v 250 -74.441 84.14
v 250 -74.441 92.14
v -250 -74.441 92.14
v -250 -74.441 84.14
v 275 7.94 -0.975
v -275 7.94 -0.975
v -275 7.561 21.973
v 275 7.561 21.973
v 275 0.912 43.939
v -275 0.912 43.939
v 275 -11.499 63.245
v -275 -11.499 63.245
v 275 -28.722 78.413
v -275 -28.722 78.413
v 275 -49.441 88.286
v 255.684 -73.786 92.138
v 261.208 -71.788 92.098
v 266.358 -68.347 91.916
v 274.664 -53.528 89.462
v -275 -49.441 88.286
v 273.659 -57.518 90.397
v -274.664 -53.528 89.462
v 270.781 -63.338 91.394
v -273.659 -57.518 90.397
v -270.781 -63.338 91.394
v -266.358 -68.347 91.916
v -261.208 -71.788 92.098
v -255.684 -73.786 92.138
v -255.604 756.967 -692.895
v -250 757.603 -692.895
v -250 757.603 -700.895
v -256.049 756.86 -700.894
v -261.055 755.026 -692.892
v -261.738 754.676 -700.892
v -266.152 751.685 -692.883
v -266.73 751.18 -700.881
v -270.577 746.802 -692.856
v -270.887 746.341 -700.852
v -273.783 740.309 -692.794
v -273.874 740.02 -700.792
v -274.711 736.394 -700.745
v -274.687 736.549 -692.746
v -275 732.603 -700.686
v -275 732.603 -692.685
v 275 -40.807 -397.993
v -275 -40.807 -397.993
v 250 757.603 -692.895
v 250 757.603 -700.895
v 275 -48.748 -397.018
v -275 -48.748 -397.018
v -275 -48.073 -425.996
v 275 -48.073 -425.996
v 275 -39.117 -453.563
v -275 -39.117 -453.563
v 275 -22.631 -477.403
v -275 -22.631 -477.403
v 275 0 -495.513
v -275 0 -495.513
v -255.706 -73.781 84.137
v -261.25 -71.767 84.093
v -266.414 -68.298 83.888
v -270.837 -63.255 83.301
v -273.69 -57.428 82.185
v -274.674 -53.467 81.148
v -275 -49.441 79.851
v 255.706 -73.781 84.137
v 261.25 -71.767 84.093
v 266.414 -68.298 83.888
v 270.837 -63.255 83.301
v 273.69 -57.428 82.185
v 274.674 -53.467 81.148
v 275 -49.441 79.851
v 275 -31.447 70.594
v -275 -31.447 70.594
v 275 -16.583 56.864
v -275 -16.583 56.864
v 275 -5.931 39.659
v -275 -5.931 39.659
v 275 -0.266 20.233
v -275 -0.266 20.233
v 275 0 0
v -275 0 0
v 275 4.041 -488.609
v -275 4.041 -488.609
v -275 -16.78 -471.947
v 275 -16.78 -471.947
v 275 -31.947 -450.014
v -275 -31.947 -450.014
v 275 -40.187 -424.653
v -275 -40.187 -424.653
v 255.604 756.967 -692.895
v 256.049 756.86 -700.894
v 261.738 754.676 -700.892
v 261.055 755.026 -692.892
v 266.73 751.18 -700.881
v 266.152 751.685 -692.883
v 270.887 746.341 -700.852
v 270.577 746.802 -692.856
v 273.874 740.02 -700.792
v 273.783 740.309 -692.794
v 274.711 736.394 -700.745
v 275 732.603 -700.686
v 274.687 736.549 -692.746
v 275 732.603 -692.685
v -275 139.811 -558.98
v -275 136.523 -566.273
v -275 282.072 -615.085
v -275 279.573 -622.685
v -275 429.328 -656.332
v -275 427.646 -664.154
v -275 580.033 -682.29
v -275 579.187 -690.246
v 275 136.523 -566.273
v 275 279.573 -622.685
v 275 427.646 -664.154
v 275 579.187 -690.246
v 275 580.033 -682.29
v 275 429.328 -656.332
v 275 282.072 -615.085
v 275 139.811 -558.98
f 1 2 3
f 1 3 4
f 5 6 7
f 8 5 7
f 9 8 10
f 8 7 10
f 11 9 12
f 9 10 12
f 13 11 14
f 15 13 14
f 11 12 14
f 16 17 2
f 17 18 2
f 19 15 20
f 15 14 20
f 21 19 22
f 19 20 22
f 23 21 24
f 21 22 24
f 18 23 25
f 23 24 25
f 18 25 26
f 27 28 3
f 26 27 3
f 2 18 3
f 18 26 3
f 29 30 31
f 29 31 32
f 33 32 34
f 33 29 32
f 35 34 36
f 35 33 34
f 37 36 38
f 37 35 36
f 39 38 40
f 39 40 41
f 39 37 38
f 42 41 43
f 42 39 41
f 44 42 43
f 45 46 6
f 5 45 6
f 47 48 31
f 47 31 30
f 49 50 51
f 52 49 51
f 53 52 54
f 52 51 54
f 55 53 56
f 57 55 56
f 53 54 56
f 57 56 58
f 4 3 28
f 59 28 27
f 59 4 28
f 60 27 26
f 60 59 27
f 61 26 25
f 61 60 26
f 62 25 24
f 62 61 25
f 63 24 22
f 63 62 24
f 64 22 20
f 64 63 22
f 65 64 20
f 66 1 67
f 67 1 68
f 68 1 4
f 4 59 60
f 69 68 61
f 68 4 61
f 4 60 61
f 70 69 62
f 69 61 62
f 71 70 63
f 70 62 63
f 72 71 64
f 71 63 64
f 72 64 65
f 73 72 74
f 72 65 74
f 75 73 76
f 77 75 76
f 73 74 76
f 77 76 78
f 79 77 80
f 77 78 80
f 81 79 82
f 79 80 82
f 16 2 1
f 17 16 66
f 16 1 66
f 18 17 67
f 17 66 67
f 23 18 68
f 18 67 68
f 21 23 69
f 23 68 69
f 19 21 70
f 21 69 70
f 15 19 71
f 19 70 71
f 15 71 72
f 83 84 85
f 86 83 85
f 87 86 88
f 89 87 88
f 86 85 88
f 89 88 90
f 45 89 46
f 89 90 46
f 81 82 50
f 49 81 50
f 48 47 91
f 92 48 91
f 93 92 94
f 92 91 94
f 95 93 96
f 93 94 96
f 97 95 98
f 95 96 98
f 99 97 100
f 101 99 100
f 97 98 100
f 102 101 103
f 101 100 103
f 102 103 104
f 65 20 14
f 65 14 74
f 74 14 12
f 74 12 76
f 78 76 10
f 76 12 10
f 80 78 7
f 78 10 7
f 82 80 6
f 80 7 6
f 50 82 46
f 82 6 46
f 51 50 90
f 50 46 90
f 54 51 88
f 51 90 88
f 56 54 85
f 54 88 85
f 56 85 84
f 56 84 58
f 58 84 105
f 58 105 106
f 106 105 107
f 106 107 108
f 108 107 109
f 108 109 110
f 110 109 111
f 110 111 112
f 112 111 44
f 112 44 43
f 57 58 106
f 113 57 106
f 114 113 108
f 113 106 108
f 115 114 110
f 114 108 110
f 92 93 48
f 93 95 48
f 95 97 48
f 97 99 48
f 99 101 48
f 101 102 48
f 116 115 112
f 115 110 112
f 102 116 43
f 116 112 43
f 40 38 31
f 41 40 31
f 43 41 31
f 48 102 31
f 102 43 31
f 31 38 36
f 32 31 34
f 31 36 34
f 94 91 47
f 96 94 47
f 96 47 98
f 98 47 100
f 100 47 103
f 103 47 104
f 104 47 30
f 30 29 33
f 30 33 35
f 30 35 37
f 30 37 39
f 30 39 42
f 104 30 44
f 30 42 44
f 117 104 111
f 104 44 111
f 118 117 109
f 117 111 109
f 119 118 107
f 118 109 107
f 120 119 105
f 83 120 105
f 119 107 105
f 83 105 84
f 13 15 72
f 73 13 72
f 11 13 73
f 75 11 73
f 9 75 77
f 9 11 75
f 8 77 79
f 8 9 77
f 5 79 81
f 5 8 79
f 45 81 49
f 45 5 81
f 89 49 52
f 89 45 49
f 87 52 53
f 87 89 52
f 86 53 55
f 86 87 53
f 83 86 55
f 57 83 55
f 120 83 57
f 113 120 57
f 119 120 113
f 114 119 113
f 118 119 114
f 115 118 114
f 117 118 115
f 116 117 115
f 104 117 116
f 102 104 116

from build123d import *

# Parameters (mm, degrees)
ODGI_CIE_START         = -275
ODGI_CIE_BAZOWE1_DEPTH = 550
ZAOKR_GLENIE1_R        = 25


# Read off the part's stored shape, not the designer's step: Odgięcie bazowe1
with BuildPart() as part:
    # Odgięcie bazowe1 outline → Odgięcie bazowe1 (new body)
    with BuildSketch(Plane(origin=(0, 0, 0), x_dir=(0, 0, -1), z_dir=(1, 0, 0)).offset(ODGI_CIE_START)):
        with BuildLine():
            ThreePointArc((0.974954747, 7.940369213), (-64.137664757, -12.277636548), (-92.140200755, -74.440961373))
            Line((-92.140200755, -74.440961373), (-84.140200755, -74.440961373))
            ThreePointArc((-84.140200755, -74.440961373), (-58.836704372, -18.269282314), (0, 0))
            Line((0, 0), (397.018460657, -48.747737362))
            ThreePointArc((397.018460657, -48.747737362), (453.562640464, -39.116973792), (495.513304801, 0))
            ThreePointArc((495.513304801, 0), (648.639105254, 365.128945319), (700.894657745, 757.603167031))
            Line((700.894657745, 757.603167031), (692.894657745, 757.603167031))
            ThreePointArc((692.894657745, 757.603167031), (640.917801534, 367.222141168), (488.608672016, 4.040550224))
            ThreePointArc((488.608672016, 4.040550224), (450.014060826, -31.947065665), (397.993415404, -40.807368149))
            Line((397.993415404, -40.807368149), (0.974954747, 7.940369213))
        make_face()
    extrude(amount=ODGI_CIE_BAZOWE1_DEPTH)

    # Zaokrąglenie1
    zaokr_glenie1_edges = [part.edges().sort_by_distance(p)[0] for p in [
        (-275, -74.440961373, 88.140200755),
        (275, 757.603167031, -696.894657745),
        (275, -74.440961373, 88.140200755),
        (-275, 757.603167031, -696.894657745),
    ]]
    fillet(zaokr_glenie1_edges, radius=ZAOKR_GLENIE1_R)


solid = part.part
